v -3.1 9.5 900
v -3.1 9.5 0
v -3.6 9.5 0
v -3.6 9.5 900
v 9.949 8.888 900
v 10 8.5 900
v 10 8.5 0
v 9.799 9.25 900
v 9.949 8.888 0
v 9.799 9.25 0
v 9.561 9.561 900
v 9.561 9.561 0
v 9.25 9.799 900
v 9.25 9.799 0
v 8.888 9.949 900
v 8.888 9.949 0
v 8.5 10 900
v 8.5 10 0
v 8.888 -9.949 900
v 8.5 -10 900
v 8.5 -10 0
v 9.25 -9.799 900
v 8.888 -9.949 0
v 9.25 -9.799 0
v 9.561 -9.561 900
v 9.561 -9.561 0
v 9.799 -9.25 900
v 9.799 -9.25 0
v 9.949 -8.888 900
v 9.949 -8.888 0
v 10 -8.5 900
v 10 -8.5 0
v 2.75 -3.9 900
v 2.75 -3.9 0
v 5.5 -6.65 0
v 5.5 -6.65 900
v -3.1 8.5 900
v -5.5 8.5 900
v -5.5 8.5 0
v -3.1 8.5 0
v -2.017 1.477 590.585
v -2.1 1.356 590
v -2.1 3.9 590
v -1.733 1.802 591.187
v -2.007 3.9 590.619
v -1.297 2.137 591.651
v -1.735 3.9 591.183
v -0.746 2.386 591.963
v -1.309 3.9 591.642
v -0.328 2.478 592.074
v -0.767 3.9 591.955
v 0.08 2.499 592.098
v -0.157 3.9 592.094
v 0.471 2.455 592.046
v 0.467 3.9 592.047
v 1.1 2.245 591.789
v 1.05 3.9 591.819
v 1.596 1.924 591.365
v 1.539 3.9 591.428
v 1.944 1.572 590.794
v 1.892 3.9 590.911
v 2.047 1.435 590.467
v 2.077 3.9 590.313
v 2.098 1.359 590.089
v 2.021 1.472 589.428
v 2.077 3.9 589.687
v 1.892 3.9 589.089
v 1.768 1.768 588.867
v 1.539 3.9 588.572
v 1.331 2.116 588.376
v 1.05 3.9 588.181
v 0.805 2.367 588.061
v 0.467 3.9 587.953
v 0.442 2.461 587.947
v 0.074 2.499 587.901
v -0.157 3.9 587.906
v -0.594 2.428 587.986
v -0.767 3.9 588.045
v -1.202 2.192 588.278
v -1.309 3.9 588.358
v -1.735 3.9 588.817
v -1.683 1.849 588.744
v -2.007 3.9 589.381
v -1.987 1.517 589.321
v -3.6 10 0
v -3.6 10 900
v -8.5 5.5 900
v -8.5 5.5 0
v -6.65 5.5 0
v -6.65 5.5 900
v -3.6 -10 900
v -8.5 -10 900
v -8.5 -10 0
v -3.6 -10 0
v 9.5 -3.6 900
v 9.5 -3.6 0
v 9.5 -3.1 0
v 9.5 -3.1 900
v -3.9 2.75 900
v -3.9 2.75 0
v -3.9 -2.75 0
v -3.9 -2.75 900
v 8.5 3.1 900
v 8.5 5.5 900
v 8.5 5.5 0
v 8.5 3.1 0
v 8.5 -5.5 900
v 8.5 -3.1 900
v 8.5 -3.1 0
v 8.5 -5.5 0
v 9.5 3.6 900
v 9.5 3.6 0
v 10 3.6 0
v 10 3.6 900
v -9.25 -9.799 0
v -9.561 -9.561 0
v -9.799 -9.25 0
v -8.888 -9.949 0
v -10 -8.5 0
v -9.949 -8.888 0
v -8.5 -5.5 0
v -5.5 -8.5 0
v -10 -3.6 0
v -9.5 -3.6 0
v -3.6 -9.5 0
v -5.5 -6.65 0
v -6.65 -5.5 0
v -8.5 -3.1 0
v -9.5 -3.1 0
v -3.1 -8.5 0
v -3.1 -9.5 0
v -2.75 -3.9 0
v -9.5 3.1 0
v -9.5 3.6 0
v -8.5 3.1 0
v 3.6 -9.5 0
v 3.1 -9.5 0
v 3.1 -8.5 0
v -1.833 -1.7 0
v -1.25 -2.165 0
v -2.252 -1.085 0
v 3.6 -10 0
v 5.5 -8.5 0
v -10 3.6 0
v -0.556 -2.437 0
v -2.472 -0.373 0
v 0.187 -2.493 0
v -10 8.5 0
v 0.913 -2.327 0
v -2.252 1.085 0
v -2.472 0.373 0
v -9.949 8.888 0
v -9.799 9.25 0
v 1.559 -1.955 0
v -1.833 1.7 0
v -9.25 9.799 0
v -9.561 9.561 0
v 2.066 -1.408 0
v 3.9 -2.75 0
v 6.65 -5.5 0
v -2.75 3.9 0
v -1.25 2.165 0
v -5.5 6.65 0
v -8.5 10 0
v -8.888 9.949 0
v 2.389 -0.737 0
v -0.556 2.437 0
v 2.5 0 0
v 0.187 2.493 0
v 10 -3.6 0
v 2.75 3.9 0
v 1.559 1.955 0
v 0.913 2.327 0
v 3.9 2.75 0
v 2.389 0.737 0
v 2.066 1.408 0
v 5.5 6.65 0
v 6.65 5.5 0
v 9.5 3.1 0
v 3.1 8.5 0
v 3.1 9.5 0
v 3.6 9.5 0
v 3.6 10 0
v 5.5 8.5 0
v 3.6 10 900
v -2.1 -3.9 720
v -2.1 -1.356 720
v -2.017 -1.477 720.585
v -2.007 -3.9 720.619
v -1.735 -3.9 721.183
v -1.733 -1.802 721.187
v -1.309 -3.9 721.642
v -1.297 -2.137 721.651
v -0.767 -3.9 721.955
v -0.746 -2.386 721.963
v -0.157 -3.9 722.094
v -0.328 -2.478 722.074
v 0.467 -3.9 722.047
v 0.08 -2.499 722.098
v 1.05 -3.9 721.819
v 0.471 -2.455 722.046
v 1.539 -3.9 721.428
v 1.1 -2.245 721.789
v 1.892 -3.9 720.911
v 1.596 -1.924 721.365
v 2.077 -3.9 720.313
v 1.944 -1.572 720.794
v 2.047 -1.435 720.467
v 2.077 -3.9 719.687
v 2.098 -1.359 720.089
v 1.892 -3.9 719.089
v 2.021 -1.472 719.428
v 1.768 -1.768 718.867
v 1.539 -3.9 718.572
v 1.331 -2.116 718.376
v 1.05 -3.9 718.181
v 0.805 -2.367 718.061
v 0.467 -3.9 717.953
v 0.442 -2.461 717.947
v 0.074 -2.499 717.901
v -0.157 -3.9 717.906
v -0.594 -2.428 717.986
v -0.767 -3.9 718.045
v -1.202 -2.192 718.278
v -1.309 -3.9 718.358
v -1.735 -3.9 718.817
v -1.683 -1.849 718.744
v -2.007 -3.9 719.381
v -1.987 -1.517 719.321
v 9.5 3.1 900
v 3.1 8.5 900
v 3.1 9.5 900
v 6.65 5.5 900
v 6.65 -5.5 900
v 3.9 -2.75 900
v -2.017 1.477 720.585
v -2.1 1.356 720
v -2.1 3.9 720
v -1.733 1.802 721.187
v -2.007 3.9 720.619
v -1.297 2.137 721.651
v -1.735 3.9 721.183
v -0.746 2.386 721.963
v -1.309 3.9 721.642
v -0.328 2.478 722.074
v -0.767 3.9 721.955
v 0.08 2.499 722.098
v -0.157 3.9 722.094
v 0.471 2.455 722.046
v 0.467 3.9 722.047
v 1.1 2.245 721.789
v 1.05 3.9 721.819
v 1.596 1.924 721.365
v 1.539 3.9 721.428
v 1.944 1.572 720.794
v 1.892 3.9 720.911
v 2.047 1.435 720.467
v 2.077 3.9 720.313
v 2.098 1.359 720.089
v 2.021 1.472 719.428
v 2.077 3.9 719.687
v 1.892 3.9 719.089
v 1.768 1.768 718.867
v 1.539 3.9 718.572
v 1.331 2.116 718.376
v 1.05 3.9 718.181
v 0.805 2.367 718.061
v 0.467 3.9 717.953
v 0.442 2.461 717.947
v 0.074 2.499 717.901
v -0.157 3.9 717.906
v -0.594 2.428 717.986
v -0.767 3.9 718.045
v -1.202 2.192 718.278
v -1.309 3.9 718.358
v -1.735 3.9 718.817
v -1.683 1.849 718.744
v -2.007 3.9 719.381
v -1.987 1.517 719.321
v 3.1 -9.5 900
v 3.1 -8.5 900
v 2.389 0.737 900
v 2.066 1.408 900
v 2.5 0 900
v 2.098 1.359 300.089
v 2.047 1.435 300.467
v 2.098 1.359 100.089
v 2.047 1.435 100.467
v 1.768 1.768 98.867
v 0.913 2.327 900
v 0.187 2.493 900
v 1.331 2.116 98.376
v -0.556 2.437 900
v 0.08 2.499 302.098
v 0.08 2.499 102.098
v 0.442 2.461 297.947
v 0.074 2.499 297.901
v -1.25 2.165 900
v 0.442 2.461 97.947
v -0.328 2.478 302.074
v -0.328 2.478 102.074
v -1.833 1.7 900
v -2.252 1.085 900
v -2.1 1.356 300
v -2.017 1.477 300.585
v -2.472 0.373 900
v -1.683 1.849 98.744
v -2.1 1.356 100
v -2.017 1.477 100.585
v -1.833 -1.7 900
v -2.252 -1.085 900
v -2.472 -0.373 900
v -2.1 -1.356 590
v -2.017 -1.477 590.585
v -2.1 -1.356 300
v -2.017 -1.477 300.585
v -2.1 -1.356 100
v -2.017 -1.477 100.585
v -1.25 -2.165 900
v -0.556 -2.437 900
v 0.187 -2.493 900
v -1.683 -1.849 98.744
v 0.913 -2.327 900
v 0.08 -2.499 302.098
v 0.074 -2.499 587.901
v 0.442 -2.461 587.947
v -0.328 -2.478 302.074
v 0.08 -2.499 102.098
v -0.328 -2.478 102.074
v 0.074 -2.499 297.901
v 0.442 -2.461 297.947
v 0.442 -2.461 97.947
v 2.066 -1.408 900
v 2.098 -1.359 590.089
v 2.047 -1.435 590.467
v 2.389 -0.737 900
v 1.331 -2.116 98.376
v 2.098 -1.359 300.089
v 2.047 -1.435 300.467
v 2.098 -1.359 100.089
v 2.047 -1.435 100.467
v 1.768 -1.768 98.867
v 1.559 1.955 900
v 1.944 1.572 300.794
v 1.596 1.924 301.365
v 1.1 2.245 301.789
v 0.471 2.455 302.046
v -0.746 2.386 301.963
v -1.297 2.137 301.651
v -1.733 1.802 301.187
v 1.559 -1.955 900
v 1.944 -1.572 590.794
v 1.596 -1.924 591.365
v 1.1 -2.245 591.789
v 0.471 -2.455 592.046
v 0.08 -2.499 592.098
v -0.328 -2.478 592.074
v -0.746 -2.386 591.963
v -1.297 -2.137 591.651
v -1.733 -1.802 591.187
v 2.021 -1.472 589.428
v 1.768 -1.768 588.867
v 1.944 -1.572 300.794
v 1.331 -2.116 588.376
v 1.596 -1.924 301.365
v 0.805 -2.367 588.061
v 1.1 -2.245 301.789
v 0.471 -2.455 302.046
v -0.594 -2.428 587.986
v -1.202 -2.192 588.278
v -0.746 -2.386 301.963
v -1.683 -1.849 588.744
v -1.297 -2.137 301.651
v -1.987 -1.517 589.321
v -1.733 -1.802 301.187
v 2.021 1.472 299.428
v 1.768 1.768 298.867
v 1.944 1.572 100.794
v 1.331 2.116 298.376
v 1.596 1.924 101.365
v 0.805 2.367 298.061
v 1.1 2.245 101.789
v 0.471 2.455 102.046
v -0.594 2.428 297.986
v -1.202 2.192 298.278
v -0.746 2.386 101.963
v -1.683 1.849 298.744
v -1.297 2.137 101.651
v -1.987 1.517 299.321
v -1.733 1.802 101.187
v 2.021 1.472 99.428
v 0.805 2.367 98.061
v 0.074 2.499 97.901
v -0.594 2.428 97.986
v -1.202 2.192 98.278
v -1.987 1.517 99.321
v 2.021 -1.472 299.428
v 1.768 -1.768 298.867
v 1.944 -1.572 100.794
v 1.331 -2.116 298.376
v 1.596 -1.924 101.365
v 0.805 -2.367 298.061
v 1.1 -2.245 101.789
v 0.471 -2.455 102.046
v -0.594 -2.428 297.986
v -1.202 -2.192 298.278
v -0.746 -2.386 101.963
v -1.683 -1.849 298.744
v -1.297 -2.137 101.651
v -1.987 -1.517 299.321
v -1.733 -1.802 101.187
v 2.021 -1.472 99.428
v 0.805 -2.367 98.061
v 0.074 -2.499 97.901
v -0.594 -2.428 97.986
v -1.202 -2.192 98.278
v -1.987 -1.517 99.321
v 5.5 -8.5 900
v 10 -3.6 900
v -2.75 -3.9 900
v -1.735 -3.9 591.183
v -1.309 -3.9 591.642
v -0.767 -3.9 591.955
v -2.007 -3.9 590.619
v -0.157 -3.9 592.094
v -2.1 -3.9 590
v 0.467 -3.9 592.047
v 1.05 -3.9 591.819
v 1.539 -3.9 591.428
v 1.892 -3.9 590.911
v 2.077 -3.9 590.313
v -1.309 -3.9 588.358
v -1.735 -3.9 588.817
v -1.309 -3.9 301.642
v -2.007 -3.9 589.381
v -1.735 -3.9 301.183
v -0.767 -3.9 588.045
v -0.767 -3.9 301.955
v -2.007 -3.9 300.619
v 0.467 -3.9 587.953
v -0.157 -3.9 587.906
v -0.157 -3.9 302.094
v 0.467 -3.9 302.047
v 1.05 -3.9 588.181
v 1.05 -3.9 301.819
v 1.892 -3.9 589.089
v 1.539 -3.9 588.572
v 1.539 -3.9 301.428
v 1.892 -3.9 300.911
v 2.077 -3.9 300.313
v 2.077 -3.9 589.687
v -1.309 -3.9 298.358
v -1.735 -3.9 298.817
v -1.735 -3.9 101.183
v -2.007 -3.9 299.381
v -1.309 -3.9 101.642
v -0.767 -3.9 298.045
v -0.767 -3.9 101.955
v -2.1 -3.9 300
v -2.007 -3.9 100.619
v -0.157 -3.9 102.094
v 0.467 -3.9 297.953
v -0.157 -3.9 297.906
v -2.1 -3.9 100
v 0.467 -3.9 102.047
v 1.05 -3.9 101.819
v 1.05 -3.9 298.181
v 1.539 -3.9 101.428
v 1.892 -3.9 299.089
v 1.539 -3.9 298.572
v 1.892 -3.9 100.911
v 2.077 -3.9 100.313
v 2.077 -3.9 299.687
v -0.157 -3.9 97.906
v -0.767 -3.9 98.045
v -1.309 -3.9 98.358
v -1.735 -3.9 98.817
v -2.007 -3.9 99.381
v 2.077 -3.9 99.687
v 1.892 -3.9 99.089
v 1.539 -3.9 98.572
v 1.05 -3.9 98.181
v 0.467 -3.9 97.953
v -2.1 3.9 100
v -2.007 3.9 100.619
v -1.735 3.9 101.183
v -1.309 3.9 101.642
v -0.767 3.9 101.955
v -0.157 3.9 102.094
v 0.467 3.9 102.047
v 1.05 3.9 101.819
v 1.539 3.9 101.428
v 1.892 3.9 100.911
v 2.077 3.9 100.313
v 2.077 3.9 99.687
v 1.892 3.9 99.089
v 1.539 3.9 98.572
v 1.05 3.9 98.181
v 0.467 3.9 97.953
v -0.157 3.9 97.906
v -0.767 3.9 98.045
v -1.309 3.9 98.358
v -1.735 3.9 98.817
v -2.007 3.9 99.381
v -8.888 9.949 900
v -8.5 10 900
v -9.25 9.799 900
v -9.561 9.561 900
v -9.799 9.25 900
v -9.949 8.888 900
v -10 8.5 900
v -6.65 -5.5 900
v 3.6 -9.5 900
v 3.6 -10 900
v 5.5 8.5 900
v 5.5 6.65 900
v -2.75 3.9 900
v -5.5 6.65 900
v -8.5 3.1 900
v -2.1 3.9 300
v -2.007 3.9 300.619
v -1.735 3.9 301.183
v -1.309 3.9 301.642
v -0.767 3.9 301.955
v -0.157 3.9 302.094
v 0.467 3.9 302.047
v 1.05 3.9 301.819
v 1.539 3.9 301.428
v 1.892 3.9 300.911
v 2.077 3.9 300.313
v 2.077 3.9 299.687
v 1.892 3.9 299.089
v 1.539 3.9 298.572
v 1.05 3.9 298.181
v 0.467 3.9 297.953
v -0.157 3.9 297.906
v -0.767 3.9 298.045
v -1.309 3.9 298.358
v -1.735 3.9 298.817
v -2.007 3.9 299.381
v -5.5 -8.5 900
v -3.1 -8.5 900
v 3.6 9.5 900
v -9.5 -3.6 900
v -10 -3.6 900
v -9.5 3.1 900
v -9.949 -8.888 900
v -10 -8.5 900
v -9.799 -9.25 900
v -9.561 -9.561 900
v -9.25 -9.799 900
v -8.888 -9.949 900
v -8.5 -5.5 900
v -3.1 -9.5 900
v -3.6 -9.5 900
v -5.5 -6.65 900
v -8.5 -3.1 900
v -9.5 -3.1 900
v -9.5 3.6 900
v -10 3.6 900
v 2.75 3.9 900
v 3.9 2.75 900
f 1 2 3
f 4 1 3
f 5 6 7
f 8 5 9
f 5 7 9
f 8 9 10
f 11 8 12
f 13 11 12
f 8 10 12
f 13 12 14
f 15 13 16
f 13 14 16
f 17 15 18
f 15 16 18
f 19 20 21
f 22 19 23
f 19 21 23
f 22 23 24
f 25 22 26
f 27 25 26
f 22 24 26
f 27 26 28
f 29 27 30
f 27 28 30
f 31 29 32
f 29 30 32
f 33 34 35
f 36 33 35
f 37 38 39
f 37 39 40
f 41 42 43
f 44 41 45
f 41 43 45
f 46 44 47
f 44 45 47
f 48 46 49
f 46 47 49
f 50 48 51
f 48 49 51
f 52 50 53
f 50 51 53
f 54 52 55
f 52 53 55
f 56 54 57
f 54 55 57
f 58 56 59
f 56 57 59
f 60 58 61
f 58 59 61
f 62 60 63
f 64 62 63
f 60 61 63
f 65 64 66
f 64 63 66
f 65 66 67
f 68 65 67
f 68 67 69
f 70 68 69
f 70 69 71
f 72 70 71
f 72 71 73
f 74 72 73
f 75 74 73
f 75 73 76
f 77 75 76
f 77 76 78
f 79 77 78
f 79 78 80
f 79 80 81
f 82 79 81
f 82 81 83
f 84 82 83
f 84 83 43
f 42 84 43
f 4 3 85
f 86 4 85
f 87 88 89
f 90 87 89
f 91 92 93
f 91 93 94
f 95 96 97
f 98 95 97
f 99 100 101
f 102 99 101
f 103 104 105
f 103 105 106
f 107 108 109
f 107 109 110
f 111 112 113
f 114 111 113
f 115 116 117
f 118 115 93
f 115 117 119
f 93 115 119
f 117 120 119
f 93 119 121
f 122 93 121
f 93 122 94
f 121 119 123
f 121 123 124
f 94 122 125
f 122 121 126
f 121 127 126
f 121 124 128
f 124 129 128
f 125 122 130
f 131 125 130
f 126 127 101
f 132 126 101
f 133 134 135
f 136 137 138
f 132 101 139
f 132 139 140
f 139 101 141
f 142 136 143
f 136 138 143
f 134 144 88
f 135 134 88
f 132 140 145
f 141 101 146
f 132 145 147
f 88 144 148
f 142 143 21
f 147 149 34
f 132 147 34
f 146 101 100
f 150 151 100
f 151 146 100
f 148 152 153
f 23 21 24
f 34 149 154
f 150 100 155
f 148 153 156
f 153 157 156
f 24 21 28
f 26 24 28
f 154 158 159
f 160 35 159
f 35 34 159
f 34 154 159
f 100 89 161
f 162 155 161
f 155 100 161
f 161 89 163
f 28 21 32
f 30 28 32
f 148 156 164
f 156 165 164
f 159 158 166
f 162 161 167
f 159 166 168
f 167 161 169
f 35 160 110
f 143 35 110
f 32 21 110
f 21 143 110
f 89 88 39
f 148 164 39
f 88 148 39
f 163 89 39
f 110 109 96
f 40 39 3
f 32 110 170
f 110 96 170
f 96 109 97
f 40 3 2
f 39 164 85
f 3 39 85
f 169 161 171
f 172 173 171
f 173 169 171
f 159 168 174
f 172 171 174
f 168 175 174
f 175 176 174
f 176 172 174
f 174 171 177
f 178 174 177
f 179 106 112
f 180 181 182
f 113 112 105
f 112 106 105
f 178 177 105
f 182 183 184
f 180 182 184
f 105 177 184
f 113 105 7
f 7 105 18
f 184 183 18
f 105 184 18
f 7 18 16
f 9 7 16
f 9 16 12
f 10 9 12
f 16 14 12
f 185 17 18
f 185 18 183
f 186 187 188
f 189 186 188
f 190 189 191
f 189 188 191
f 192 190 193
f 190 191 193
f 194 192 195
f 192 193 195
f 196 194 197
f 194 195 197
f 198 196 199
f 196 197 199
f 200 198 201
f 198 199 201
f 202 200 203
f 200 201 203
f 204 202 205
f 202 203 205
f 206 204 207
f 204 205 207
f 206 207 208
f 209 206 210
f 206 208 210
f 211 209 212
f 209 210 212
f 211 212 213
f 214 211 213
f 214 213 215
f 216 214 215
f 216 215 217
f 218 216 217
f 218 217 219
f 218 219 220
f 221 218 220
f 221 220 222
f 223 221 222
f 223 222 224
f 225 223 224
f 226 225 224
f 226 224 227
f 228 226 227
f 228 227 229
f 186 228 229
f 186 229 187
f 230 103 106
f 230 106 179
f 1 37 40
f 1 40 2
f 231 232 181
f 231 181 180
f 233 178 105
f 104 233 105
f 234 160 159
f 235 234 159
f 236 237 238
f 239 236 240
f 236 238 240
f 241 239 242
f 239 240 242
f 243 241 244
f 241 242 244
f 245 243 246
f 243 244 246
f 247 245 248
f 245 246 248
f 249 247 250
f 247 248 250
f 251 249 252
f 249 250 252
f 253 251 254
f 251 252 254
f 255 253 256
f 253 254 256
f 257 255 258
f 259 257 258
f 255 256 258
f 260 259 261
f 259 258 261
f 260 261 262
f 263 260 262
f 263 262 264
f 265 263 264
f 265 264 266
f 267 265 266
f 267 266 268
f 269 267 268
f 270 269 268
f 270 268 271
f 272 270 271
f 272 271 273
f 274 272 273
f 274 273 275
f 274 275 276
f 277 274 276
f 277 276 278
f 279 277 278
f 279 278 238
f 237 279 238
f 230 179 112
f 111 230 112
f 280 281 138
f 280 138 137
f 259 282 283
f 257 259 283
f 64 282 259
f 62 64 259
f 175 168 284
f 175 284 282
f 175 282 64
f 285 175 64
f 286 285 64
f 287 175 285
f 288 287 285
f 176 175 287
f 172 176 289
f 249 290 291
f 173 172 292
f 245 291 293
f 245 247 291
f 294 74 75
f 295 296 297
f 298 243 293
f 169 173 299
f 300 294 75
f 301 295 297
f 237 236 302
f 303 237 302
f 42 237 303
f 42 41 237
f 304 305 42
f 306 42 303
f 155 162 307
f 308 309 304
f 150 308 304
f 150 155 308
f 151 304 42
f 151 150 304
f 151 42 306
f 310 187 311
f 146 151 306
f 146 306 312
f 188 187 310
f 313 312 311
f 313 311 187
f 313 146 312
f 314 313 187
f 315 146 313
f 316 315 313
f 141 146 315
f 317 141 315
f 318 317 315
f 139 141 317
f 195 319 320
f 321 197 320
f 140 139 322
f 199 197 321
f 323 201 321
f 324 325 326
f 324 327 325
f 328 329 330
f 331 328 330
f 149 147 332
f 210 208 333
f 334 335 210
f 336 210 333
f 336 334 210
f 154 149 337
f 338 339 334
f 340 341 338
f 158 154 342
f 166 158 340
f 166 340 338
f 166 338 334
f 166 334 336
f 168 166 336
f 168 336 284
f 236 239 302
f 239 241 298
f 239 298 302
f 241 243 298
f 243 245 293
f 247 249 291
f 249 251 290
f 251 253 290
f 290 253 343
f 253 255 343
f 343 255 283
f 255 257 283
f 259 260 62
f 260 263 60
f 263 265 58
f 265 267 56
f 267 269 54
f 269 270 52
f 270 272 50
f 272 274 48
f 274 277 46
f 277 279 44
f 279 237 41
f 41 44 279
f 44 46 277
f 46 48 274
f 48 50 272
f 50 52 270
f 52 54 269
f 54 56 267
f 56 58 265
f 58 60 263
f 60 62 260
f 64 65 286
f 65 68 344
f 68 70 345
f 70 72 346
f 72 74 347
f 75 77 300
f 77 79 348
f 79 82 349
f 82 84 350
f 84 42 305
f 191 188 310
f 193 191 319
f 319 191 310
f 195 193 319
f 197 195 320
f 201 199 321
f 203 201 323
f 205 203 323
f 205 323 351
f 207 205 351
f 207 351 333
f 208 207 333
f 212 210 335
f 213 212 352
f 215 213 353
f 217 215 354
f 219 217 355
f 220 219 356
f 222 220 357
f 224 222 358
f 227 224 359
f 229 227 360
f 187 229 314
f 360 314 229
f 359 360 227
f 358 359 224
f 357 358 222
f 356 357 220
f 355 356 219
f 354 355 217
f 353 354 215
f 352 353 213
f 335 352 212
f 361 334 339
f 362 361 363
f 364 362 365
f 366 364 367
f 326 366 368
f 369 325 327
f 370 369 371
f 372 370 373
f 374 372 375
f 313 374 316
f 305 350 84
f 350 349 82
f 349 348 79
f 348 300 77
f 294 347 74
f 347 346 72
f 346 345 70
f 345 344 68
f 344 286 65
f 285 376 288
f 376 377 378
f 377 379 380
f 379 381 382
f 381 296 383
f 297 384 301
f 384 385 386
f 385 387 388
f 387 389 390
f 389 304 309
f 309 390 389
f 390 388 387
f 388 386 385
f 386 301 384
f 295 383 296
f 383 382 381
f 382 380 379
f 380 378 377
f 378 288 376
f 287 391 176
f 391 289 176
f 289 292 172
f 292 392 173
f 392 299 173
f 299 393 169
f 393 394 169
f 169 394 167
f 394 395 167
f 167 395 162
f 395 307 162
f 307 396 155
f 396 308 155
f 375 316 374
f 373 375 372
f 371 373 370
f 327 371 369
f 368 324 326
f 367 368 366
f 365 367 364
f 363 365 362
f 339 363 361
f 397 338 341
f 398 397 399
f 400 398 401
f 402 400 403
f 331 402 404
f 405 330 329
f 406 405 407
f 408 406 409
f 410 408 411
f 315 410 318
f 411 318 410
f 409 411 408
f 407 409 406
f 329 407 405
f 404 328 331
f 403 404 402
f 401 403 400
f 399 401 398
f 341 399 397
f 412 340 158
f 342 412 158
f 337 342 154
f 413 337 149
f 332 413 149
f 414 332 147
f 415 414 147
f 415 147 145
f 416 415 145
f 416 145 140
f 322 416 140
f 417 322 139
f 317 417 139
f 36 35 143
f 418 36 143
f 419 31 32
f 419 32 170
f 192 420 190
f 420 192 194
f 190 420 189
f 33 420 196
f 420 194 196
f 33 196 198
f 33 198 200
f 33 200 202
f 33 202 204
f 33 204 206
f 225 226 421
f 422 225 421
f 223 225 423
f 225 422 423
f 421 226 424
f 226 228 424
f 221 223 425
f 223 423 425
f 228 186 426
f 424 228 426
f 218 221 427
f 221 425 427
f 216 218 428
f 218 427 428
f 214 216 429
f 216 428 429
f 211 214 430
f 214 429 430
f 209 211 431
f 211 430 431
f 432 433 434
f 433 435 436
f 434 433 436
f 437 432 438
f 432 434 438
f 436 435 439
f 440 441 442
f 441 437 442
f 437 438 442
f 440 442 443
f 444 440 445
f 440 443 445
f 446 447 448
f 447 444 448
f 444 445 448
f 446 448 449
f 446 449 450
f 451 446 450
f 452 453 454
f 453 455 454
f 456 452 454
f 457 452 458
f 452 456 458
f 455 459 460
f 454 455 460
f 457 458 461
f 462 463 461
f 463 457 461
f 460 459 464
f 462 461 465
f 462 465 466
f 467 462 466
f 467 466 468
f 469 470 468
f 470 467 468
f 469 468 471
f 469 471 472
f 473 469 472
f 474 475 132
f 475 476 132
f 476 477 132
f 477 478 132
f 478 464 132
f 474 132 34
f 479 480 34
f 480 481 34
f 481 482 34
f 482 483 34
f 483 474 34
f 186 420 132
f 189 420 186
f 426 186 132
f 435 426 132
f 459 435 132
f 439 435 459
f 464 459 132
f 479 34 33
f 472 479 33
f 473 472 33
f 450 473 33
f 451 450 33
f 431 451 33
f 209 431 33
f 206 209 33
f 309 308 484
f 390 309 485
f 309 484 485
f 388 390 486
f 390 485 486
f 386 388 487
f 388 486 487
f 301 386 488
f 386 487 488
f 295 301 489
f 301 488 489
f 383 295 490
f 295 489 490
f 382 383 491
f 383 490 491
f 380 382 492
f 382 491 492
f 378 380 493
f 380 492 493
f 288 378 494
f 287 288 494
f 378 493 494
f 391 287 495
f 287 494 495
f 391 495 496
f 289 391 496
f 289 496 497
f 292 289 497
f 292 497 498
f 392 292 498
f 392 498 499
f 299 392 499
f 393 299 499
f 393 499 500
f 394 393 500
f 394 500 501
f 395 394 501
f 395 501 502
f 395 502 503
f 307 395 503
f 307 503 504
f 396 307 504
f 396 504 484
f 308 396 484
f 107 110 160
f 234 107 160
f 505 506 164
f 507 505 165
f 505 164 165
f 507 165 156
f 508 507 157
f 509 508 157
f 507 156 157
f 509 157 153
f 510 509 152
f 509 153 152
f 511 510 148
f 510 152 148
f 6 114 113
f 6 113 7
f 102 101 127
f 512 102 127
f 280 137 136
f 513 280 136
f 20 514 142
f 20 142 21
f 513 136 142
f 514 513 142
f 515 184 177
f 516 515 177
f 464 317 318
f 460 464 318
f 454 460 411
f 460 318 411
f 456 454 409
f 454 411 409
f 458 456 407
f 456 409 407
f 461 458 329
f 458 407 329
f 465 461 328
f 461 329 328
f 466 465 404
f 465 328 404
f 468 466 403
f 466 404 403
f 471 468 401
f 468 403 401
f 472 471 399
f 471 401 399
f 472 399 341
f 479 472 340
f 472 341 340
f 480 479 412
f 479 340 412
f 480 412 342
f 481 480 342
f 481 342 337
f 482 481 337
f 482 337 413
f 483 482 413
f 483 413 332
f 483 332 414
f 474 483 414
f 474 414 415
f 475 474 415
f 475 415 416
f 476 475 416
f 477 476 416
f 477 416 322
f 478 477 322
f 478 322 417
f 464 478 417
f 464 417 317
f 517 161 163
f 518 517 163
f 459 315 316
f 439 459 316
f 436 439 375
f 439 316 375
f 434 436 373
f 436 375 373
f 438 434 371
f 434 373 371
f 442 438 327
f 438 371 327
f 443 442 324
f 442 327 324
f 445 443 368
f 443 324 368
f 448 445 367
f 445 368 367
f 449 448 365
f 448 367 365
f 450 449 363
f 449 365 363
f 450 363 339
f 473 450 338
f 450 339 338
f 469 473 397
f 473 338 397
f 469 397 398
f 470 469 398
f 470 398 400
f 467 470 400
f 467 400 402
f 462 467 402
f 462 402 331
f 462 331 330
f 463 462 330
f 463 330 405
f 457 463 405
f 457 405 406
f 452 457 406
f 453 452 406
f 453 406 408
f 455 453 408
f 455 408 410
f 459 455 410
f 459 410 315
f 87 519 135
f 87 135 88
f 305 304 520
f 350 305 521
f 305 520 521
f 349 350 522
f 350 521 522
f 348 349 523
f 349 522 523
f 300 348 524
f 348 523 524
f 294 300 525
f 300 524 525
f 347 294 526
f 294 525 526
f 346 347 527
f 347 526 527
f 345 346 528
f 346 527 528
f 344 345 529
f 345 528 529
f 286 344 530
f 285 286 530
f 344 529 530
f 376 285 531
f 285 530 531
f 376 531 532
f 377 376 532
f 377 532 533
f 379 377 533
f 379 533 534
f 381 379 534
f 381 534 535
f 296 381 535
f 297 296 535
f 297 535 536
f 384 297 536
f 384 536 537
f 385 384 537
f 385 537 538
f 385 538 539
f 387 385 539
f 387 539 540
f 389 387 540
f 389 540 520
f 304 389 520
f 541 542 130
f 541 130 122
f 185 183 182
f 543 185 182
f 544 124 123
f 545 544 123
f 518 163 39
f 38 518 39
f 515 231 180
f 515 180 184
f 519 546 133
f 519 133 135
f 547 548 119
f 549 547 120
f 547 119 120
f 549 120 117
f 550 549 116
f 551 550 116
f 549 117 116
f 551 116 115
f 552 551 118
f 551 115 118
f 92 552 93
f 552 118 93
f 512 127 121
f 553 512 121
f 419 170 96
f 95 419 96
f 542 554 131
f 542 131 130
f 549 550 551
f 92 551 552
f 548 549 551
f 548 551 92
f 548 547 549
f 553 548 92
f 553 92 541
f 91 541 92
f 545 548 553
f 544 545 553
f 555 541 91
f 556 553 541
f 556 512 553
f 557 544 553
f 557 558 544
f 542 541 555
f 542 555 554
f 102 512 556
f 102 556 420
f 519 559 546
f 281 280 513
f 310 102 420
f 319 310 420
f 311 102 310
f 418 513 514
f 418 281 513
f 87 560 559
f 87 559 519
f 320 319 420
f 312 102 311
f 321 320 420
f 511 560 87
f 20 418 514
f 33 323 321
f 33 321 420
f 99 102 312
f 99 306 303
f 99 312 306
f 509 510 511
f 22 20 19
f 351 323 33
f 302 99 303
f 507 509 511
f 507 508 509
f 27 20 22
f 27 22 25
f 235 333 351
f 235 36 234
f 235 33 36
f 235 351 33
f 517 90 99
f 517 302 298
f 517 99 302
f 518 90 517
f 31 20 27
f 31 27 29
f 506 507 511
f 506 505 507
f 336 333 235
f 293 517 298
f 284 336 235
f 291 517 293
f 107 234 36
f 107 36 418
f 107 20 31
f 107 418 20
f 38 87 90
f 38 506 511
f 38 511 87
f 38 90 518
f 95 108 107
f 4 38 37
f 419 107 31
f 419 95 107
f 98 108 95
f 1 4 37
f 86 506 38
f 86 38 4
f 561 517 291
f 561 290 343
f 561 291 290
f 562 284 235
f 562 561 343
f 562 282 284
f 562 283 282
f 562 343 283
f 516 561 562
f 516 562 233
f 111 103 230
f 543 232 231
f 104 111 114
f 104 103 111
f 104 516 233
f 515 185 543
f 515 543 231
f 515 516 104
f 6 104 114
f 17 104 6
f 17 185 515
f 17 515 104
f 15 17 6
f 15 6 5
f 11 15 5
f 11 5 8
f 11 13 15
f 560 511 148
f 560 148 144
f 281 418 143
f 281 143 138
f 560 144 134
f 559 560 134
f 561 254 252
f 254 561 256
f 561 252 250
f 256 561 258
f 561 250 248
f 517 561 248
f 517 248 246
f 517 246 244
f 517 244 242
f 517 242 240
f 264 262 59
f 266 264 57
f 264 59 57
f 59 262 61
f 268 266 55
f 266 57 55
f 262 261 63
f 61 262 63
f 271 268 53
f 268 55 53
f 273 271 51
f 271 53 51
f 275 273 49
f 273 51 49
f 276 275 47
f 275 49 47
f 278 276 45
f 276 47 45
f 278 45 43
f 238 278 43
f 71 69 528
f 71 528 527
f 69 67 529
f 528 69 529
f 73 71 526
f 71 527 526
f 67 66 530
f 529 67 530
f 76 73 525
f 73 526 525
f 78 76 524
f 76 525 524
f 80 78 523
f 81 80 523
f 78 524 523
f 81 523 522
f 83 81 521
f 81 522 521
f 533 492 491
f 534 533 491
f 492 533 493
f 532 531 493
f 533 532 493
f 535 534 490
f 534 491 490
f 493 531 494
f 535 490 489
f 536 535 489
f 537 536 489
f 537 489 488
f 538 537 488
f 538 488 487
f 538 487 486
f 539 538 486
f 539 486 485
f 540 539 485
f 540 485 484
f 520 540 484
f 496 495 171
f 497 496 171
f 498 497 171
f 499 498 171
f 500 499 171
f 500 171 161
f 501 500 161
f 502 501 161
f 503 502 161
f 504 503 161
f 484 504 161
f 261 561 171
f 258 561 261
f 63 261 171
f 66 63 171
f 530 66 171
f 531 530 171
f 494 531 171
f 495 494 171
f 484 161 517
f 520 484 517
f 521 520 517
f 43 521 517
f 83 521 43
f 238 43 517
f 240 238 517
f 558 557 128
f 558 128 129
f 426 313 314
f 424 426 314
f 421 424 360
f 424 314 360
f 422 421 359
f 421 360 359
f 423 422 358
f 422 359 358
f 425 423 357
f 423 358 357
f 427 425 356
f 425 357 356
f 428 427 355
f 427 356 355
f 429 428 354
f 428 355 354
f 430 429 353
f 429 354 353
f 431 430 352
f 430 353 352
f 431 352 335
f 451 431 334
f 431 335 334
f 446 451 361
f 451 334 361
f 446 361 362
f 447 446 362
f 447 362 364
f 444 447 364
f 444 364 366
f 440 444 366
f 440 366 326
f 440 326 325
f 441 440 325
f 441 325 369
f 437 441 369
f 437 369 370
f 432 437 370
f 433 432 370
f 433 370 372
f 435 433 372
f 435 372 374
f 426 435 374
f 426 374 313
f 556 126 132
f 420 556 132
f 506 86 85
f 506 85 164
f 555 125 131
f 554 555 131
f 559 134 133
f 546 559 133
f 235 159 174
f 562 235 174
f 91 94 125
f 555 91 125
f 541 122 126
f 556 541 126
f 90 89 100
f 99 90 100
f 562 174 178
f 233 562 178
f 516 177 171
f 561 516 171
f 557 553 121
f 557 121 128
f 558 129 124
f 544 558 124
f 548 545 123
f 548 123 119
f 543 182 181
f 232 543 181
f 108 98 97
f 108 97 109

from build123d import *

# Parameters (mm, degrees)
EXTRUDE_1_DEPTH     = 900
SKETCH_6_R          = 2.1
CUT_EXTRUDE_3_DEPTH = 901.162879706
SKETCH_5_R          = 2.1
CUT_EXTRUDE_4_DEPTH = 901.162879806
SKETCH_7_R          = 2.1
CUT_EXTRUDE_5_DEPTH = 901.162879806


with BuildPart() as part:
    # 草图1 → 凸台-拉伸1 (new body)
    with BuildSketch(Plane.XY):
        with BuildLine():
            Line((8.5, 10), (3.6, 10))
            Line((3.6, 10), (3.6, 9.5))
            Line((3.6, 9.5), (3.1, 9.5))
            Line((3.1, 9.5), (3.1, 8.5))
            Line((3.1, 8.5), (5.5, 8.5))
            Line((5.5, 8.5), (5.5, 6.65))
            Line((5.5, 6.65), (2.75, 3.9))
            Line((2.75, 3.9), (-2.75, 3.9))
            Line((-2.75, 3.9), (-5.5, 6.65))
            Line((-5.5, 6.65), (-5.5, 8.5))
            Line((-5.5, 8.5), (-3.1, 8.5))
            Line((-3.1, 8.5), (-3.1, 9.5))
            Line((-3.1, 9.5), (-3.6, 9.5))
            Line((-3.6, 9.5), (-3.6, 10))
            Line((-3.6, 10), (-8.5, 10))
            ThreePointArc((-8.5, 10), (-9.560660172, 9.560660172), (-10, 8.5))
            Line((-10, 8.5), (-10, 3.6))
            Line((-10, 3.6), (-9.5, 3.6))
            Line((-9.5, 3.6), (-9.5, 3.1))
            Line((-9.5, 3.1), (-8.5, 3.1))
            Line((-8.5, 3.1), (-8.5, 5.5))
            Line((-8.5, 5.5), (-6.65, 5.5))
            Line((-6.65, 5.5), (-3.9, 2.75))
            Line((-3.9, 2.75), (-3.9, -2.75))
            Line((-3.9, -2.75), (-6.65, -5.5))
            Line((-6.65, -5.5), (-8.5, -5.5))
            Line((-8.5, -5.5), (-8.5, -3.1))
            Line((-8.5, -3.1), (-9.5, -3.1))
            Line((-9.5, -3.1), (-9.5, -3.6))
            Line((-9.5, -3.6), (-10, -3.6))
            Line((-10, -3.6), (-10, -8.5))
            ThreePointArc((-10, -8.5), (-9.560660172, -9.560660172), (-8.5, -10))
            Line((-8.5, -10), (-3.6, -10))
            Line((-3.6, -10), (-3.6, -9.5))
            Line((-3.6, -9.5), (-3.1, -9.5))
            Line((-3.1, -9.5), (-3.1, -8.5))
            Line((-3.1, -8.5), (-5.5, -8.5))
            Line((-5.5, -8.5), (-5.5, -6.65))
            Line((-5.5, -6.65), (-2.75, -3.9))
            Line((-2.75, -3.9), (2.75, -3.9))
            Line((2.75, -3.9), (5.5, -6.65))
            Line((5.5, -6.65), (5.5, -8.5))
            Line((5.5, -8.5), (3.1, -8.5))
            Line((3.1, -8.5), (3.1, -9.5))
            Line((3.1, -9.5), (3.6, -9.5))
            Line((3.6, -9.5), (3.6, -10))
            Line((3.6, -10), (8.5, -10))
            ThreePointArc((8.5, -10), (9.560660172, -9.560660172), (10, -8.5))
            Line((10, -8.5), (10, -3.6))
            Line((10, -3.6), (9.5, -3.6))
            Line((9.5, -3.6), (9.5, -3.1))
            Line((9.5, -3.1), (8.5, -3.1))
            Line((8.5, -3.1), (8.5, -5.5))
            Line((8.5, -5.5), (6.65, -5.5))
            Line((6.65, -5.5), (3.9, -2.75))
            Line((3.9, -2.75), (3.9, 2.75))
            Line((3.9, 2.75), (6.65, 5.5))
            Line((6.65, 5.5), (8.5, 5.5))
            Line((8.5, 5.5), (8.5, 3.1))
            Line((8.5, 3.1), (9.5, 3.1))
            Line((9.5, 3.1), (9.5, 3.6))
            Line((9.5, 3.6), (10, 3.6))
            Line((10, 3.6), (10, 8.5))
            ThreePointArc((10, 8.5), (9.560660172, 9.560660172), (8.5, 10))
        make_face()
        with BuildLine():
            ThreePointArc((-2.5, 0), (0, -2.5), (2.5, 0))
            ThreePointArc((2.5, 0), (0, 2.5), (-2.5, 0))
        make_face(mode=Mode.SUBTRACT)
    extrude(amount=EXTRUDE_1_DEPTH)

    # 草图6 → 切除-拉伸3 (cut, through all)
    with BuildSketch(Plane(origin=(0, 3.9, 0), x_dir=(1, 0, 0), z_dir=(0, 1, 0))):
        with Locations(Location((0, -590, 0), (0, 0, 180))):
            Circle(SKETCH_6_R)
    extrude(amount=-CUT_EXTRUDE_3_DEPTH, mode=Mode.SUBTRACT)

    # 草图5 → 切除-拉伸4 (cut, through all)
    with BuildSketch(Plane(origin=(0, 3.9, 0), x_dir=(1, 0, 0), z_dir=(0, 1, 0))):
        with Locations(Location((0, -720, 0), (0, 0, 180))):
            Circle(SKETCH_5_R)
    extrude(amount=-CUT_EXTRUDE_4_DEPTH, mode=Mode.SUBTRACT)

    # 草图7 → 切除-拉伸5 (cut, through all)
    with BuildSketch(Plane(origin=(0, 3.9, 0), x_dir=(1, 0, 0), z_dir=(0, 1, 0))):
        with Locations(Location((0, -300, 0), (0, 0, 180))):
            Circle(SKETCH_7_R)
        with Locations(Location((0, -100, 0), (0, 0, 180))):
            Circle(SKETCH_7_R)
    extrude(amount=-CUT_EXTRUDE_5_DEPTH, mode=Mode.SUBTRACT)


solid = part.part
